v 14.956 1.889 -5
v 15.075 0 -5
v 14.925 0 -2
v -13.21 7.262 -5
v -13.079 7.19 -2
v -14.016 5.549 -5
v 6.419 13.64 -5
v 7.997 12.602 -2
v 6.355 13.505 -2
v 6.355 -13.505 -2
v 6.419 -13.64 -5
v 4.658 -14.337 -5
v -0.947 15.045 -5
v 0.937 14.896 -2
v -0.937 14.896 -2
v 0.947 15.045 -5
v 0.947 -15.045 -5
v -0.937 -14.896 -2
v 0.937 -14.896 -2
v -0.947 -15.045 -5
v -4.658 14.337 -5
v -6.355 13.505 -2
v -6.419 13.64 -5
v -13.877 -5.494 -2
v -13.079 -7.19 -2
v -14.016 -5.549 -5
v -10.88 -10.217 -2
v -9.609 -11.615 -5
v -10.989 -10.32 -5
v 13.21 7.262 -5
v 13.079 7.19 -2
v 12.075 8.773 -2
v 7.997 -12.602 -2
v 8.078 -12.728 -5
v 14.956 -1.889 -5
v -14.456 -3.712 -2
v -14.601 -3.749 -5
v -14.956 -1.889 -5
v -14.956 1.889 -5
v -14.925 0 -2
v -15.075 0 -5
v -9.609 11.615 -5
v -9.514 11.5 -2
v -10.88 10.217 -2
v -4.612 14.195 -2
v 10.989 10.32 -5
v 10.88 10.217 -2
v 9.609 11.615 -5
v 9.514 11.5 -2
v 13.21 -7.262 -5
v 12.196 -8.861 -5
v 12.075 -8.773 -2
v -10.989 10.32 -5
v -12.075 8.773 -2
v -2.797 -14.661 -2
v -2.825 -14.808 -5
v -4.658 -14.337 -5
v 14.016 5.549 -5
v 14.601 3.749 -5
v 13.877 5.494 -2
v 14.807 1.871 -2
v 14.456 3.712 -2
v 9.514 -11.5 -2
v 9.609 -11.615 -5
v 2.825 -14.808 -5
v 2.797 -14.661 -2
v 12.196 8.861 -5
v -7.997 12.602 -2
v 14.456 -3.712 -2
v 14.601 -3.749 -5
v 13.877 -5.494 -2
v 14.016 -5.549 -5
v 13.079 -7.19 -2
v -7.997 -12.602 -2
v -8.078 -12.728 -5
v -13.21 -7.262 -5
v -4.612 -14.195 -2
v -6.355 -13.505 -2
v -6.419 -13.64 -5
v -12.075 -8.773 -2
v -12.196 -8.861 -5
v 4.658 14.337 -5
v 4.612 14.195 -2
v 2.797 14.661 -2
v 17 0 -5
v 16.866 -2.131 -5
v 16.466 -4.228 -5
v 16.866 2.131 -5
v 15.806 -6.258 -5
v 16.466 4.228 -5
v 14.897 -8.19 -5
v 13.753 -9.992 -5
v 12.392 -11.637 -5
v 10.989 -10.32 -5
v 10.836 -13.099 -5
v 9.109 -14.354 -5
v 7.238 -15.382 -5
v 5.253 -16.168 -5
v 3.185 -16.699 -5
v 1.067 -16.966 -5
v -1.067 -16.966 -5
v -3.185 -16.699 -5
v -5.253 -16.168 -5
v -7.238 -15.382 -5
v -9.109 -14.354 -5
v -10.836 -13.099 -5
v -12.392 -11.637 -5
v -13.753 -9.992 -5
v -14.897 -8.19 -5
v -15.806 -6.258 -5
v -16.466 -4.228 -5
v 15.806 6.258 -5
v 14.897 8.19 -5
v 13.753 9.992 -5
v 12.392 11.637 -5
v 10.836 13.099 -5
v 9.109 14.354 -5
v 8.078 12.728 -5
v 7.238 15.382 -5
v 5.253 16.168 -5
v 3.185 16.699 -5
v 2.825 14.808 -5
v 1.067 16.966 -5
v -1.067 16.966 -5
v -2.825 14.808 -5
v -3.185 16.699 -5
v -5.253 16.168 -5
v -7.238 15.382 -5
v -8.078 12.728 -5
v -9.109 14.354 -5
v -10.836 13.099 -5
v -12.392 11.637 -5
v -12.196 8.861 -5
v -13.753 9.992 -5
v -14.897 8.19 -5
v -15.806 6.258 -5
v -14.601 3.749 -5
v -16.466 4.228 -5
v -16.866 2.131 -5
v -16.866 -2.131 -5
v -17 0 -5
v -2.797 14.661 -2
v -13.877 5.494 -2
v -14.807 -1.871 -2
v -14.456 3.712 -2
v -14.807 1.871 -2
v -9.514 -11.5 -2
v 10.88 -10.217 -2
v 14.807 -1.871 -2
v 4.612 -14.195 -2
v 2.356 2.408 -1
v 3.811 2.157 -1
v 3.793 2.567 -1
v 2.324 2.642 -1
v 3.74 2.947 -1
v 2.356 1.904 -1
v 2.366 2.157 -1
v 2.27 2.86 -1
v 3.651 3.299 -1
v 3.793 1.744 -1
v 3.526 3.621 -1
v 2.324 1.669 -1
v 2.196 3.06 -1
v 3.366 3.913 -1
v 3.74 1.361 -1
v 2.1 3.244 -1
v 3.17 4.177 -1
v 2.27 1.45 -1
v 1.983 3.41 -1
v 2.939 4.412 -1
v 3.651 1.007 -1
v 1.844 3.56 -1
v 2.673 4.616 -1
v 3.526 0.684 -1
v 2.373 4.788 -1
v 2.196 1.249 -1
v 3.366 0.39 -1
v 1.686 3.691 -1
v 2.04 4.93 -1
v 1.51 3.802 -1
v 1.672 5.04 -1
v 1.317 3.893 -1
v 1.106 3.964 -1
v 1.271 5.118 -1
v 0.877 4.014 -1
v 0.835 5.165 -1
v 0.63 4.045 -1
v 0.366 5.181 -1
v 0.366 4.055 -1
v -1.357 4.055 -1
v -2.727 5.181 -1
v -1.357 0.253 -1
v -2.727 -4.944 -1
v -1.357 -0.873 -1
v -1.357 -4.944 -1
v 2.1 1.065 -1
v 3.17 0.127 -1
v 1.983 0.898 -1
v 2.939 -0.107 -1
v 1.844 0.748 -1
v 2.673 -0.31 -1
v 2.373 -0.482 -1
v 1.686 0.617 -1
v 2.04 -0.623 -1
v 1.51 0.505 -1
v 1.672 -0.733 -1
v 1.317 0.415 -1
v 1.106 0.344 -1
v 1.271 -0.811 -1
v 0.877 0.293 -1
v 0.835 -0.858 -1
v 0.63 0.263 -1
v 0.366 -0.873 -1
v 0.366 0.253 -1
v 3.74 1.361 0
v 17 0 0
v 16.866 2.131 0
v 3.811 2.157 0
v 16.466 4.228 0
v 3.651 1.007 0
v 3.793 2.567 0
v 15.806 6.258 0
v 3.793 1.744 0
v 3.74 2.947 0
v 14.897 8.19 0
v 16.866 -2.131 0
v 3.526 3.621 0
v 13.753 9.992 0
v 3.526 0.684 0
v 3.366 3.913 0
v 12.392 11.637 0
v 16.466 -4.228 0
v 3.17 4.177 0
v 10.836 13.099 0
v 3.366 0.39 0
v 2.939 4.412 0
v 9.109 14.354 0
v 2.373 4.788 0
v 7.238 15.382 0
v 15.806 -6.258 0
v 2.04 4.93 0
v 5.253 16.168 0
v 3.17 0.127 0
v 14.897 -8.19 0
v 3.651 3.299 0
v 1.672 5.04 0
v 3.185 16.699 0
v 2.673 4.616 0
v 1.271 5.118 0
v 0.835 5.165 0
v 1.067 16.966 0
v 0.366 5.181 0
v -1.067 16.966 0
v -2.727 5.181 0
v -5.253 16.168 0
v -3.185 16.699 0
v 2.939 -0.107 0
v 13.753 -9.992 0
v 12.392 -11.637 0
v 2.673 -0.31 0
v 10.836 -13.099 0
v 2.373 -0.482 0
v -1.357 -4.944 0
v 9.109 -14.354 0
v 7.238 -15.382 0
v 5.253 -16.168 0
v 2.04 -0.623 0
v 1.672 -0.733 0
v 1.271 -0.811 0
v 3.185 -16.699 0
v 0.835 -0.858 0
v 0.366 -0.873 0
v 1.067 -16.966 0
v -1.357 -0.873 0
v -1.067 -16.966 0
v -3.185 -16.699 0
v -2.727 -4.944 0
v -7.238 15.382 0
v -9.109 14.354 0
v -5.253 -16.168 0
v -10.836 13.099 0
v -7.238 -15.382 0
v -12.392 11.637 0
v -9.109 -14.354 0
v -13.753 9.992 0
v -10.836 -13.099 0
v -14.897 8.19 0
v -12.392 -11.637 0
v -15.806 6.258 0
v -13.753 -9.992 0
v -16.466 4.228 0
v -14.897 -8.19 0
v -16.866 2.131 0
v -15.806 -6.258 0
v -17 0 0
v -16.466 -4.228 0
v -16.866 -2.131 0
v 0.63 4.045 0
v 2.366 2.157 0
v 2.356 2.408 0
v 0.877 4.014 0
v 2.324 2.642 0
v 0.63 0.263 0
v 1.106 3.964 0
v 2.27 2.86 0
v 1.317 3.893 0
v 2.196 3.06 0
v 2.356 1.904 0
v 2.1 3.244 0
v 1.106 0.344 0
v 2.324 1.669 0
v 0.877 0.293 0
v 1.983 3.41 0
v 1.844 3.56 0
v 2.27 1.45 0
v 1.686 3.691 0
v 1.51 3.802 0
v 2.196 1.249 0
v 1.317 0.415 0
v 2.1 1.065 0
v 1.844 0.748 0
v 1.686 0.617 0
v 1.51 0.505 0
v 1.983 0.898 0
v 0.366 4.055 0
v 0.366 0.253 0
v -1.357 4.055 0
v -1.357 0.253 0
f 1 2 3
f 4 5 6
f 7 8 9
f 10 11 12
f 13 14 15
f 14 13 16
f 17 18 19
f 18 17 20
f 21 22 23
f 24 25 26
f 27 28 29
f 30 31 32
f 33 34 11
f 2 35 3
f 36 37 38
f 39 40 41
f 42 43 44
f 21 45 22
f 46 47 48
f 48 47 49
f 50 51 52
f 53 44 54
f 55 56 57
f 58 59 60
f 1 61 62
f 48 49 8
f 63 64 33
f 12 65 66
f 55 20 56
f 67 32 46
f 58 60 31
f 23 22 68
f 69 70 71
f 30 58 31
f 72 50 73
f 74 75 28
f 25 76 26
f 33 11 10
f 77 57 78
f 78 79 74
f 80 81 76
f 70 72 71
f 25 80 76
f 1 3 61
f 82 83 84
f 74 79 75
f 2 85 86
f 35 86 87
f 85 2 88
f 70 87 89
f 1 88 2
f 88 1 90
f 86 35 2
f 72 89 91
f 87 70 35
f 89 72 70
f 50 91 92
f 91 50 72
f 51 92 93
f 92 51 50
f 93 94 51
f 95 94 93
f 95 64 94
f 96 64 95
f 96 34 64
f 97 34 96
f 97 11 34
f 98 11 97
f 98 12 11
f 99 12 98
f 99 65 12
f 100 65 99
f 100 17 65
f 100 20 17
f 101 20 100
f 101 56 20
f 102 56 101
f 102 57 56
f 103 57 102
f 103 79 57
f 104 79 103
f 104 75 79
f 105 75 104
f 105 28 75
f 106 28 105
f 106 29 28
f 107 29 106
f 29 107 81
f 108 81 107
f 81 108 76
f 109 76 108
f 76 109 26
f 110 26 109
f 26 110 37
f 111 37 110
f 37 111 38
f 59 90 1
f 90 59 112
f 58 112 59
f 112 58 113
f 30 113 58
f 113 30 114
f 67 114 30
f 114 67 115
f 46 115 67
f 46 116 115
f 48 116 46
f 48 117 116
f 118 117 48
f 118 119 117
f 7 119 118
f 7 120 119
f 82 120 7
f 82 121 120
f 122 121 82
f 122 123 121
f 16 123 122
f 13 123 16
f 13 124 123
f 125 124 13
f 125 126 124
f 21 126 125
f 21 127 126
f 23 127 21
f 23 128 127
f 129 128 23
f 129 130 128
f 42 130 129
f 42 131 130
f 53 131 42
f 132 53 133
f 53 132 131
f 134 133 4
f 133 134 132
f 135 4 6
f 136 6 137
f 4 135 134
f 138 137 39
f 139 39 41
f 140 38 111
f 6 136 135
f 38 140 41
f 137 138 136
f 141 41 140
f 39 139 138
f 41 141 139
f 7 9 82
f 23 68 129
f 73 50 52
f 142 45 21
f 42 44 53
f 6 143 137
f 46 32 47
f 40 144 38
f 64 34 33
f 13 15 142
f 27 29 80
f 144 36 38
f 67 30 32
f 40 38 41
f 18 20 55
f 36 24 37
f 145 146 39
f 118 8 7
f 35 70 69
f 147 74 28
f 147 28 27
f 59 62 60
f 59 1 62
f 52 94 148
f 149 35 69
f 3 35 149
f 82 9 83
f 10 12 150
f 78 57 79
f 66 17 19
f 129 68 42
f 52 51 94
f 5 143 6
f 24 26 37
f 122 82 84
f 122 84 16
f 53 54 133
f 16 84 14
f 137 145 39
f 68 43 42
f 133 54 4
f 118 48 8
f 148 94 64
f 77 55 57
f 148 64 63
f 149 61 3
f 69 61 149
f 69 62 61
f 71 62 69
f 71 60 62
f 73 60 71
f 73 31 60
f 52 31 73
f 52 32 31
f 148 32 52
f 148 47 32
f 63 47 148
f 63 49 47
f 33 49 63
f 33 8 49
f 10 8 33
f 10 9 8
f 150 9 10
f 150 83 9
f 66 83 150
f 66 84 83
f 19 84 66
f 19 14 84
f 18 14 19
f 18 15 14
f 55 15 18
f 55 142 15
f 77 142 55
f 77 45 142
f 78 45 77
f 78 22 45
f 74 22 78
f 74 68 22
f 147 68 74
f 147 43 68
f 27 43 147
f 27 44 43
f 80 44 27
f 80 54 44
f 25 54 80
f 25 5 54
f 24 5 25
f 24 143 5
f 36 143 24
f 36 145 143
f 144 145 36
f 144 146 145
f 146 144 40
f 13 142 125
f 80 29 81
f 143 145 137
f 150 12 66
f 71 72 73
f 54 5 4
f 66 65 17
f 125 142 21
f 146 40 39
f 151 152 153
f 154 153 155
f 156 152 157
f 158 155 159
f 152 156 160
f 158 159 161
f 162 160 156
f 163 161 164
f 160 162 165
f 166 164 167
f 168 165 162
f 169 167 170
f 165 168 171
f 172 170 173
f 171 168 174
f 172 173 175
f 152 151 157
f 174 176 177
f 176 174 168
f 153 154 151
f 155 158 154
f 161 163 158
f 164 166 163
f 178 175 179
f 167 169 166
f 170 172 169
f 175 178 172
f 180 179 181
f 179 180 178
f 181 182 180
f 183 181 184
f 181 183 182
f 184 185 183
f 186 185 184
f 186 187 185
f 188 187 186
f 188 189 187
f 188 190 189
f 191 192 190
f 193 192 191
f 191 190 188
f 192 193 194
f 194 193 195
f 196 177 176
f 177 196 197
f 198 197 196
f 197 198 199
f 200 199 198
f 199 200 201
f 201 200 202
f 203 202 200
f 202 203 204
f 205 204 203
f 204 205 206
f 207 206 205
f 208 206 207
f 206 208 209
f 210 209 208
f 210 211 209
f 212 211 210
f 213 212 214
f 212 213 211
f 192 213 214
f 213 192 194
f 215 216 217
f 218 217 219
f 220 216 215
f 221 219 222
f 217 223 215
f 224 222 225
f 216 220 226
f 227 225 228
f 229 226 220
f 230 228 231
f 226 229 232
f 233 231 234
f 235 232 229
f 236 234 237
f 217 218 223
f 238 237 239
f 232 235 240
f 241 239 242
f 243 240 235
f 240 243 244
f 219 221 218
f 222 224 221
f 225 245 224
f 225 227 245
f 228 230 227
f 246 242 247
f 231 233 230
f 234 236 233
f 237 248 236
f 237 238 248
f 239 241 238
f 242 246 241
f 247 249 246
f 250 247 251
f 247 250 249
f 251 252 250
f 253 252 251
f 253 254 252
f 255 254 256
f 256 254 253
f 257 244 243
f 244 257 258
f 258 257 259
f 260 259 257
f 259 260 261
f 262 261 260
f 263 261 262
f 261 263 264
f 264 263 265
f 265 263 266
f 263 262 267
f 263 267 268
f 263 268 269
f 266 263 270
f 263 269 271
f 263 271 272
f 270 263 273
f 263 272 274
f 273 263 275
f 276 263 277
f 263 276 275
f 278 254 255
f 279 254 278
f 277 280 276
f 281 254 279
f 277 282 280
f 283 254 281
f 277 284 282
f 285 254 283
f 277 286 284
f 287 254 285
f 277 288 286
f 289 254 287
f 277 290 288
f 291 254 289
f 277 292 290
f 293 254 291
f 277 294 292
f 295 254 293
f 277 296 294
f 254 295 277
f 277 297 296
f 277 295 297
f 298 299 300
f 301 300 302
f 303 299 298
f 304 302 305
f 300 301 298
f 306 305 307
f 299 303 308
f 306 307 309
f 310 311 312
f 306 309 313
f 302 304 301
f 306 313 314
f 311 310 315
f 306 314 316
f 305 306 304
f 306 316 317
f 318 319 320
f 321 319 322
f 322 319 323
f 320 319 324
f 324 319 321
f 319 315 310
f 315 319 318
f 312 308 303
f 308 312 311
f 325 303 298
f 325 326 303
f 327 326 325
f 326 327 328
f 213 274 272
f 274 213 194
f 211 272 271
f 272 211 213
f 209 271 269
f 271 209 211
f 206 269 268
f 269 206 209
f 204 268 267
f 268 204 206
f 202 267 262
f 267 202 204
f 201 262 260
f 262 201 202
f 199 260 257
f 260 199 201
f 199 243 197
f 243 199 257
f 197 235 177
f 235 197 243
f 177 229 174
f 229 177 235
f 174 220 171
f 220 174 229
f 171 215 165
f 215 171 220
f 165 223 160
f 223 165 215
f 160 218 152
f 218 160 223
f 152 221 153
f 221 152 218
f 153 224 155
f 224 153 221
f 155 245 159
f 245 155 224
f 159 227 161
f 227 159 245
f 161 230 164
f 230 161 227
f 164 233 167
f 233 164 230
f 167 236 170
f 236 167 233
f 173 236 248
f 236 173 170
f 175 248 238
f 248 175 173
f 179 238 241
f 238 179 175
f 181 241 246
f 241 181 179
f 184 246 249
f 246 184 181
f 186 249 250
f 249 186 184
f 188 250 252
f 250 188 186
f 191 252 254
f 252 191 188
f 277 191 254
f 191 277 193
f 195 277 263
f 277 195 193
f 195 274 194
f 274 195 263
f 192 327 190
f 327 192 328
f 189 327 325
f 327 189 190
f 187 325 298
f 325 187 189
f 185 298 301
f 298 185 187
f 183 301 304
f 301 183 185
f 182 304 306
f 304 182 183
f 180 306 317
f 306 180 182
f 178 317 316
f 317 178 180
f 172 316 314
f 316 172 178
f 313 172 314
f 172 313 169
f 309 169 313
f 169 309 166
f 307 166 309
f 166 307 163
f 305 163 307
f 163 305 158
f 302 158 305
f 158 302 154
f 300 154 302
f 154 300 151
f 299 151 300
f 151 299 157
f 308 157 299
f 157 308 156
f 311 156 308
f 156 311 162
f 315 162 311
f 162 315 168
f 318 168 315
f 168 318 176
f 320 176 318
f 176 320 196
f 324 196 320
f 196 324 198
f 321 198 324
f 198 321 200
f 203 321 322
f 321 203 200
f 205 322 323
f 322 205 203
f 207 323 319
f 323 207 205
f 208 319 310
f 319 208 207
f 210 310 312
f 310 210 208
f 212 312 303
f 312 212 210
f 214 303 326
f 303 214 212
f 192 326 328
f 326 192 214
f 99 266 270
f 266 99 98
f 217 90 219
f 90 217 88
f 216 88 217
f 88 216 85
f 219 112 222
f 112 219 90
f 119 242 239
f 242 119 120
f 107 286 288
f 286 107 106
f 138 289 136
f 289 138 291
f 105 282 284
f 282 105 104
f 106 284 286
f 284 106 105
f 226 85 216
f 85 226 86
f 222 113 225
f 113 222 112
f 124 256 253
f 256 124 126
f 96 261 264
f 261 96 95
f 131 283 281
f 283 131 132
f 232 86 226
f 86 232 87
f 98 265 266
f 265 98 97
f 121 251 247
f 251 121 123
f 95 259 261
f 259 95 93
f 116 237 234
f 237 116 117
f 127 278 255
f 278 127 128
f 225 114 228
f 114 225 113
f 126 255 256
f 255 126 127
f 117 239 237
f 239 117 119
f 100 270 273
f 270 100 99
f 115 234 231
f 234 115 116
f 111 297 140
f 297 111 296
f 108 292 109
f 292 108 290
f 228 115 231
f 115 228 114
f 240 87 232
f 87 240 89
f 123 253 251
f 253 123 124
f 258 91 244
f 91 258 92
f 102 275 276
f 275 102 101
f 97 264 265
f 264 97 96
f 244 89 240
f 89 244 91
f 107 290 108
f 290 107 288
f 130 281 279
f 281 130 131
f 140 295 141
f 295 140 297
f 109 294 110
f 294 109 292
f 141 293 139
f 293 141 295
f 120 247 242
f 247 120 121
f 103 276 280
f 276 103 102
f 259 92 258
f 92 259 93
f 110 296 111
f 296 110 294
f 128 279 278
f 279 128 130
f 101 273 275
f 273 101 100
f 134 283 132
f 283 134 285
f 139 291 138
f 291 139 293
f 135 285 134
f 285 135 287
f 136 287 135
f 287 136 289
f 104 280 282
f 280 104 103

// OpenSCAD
$fn = 50;

difference() {
	union() {
		translate(v = [0, 0, -5.0]) {
			cylinder(h = 5, r = 17.0);
		}
	}
	union() {
		#translate(v = [0, 0, -5.0]) {
			cylinder(h = 3, r1 = 15.075, r2 = 14.925);
		}
		translate(v = [0, 0, -1]) {
			linear_extrude(height = 1) {
				text(font = "Impact", halign = "center", size = 10, text = "P", valign = "center");
			}
		}
	}
}
